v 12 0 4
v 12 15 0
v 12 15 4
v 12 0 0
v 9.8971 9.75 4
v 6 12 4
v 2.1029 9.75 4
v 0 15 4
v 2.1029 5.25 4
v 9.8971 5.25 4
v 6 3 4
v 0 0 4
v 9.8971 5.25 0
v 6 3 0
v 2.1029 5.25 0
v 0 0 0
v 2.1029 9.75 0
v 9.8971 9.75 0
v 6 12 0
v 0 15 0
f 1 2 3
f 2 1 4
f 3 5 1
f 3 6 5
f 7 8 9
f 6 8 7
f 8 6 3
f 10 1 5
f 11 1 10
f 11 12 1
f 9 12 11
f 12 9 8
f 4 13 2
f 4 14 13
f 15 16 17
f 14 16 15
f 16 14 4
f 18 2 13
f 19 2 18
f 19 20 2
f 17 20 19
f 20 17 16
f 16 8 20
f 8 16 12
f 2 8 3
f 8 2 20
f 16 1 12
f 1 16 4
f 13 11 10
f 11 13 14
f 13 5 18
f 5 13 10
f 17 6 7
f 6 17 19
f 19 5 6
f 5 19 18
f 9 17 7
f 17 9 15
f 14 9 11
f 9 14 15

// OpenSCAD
// PRUSA iteration3
// x end motor
// GNU GPL v3
// Josef Průša <iam@josefprusa.cz> and contributors
// http://www.reprap.org/wiki/Prusa_Mendel
// http://prusamendel.org
module x_end_holes(){
// Belt hole
// Nut trap
rotate([0,0,30]) cylinder(h = 16, r=4.5, $fn = 6);
}

difference() {
	cube([12,15,4]);
	translate([6,7.5,-5]) x_end_holes();
}
